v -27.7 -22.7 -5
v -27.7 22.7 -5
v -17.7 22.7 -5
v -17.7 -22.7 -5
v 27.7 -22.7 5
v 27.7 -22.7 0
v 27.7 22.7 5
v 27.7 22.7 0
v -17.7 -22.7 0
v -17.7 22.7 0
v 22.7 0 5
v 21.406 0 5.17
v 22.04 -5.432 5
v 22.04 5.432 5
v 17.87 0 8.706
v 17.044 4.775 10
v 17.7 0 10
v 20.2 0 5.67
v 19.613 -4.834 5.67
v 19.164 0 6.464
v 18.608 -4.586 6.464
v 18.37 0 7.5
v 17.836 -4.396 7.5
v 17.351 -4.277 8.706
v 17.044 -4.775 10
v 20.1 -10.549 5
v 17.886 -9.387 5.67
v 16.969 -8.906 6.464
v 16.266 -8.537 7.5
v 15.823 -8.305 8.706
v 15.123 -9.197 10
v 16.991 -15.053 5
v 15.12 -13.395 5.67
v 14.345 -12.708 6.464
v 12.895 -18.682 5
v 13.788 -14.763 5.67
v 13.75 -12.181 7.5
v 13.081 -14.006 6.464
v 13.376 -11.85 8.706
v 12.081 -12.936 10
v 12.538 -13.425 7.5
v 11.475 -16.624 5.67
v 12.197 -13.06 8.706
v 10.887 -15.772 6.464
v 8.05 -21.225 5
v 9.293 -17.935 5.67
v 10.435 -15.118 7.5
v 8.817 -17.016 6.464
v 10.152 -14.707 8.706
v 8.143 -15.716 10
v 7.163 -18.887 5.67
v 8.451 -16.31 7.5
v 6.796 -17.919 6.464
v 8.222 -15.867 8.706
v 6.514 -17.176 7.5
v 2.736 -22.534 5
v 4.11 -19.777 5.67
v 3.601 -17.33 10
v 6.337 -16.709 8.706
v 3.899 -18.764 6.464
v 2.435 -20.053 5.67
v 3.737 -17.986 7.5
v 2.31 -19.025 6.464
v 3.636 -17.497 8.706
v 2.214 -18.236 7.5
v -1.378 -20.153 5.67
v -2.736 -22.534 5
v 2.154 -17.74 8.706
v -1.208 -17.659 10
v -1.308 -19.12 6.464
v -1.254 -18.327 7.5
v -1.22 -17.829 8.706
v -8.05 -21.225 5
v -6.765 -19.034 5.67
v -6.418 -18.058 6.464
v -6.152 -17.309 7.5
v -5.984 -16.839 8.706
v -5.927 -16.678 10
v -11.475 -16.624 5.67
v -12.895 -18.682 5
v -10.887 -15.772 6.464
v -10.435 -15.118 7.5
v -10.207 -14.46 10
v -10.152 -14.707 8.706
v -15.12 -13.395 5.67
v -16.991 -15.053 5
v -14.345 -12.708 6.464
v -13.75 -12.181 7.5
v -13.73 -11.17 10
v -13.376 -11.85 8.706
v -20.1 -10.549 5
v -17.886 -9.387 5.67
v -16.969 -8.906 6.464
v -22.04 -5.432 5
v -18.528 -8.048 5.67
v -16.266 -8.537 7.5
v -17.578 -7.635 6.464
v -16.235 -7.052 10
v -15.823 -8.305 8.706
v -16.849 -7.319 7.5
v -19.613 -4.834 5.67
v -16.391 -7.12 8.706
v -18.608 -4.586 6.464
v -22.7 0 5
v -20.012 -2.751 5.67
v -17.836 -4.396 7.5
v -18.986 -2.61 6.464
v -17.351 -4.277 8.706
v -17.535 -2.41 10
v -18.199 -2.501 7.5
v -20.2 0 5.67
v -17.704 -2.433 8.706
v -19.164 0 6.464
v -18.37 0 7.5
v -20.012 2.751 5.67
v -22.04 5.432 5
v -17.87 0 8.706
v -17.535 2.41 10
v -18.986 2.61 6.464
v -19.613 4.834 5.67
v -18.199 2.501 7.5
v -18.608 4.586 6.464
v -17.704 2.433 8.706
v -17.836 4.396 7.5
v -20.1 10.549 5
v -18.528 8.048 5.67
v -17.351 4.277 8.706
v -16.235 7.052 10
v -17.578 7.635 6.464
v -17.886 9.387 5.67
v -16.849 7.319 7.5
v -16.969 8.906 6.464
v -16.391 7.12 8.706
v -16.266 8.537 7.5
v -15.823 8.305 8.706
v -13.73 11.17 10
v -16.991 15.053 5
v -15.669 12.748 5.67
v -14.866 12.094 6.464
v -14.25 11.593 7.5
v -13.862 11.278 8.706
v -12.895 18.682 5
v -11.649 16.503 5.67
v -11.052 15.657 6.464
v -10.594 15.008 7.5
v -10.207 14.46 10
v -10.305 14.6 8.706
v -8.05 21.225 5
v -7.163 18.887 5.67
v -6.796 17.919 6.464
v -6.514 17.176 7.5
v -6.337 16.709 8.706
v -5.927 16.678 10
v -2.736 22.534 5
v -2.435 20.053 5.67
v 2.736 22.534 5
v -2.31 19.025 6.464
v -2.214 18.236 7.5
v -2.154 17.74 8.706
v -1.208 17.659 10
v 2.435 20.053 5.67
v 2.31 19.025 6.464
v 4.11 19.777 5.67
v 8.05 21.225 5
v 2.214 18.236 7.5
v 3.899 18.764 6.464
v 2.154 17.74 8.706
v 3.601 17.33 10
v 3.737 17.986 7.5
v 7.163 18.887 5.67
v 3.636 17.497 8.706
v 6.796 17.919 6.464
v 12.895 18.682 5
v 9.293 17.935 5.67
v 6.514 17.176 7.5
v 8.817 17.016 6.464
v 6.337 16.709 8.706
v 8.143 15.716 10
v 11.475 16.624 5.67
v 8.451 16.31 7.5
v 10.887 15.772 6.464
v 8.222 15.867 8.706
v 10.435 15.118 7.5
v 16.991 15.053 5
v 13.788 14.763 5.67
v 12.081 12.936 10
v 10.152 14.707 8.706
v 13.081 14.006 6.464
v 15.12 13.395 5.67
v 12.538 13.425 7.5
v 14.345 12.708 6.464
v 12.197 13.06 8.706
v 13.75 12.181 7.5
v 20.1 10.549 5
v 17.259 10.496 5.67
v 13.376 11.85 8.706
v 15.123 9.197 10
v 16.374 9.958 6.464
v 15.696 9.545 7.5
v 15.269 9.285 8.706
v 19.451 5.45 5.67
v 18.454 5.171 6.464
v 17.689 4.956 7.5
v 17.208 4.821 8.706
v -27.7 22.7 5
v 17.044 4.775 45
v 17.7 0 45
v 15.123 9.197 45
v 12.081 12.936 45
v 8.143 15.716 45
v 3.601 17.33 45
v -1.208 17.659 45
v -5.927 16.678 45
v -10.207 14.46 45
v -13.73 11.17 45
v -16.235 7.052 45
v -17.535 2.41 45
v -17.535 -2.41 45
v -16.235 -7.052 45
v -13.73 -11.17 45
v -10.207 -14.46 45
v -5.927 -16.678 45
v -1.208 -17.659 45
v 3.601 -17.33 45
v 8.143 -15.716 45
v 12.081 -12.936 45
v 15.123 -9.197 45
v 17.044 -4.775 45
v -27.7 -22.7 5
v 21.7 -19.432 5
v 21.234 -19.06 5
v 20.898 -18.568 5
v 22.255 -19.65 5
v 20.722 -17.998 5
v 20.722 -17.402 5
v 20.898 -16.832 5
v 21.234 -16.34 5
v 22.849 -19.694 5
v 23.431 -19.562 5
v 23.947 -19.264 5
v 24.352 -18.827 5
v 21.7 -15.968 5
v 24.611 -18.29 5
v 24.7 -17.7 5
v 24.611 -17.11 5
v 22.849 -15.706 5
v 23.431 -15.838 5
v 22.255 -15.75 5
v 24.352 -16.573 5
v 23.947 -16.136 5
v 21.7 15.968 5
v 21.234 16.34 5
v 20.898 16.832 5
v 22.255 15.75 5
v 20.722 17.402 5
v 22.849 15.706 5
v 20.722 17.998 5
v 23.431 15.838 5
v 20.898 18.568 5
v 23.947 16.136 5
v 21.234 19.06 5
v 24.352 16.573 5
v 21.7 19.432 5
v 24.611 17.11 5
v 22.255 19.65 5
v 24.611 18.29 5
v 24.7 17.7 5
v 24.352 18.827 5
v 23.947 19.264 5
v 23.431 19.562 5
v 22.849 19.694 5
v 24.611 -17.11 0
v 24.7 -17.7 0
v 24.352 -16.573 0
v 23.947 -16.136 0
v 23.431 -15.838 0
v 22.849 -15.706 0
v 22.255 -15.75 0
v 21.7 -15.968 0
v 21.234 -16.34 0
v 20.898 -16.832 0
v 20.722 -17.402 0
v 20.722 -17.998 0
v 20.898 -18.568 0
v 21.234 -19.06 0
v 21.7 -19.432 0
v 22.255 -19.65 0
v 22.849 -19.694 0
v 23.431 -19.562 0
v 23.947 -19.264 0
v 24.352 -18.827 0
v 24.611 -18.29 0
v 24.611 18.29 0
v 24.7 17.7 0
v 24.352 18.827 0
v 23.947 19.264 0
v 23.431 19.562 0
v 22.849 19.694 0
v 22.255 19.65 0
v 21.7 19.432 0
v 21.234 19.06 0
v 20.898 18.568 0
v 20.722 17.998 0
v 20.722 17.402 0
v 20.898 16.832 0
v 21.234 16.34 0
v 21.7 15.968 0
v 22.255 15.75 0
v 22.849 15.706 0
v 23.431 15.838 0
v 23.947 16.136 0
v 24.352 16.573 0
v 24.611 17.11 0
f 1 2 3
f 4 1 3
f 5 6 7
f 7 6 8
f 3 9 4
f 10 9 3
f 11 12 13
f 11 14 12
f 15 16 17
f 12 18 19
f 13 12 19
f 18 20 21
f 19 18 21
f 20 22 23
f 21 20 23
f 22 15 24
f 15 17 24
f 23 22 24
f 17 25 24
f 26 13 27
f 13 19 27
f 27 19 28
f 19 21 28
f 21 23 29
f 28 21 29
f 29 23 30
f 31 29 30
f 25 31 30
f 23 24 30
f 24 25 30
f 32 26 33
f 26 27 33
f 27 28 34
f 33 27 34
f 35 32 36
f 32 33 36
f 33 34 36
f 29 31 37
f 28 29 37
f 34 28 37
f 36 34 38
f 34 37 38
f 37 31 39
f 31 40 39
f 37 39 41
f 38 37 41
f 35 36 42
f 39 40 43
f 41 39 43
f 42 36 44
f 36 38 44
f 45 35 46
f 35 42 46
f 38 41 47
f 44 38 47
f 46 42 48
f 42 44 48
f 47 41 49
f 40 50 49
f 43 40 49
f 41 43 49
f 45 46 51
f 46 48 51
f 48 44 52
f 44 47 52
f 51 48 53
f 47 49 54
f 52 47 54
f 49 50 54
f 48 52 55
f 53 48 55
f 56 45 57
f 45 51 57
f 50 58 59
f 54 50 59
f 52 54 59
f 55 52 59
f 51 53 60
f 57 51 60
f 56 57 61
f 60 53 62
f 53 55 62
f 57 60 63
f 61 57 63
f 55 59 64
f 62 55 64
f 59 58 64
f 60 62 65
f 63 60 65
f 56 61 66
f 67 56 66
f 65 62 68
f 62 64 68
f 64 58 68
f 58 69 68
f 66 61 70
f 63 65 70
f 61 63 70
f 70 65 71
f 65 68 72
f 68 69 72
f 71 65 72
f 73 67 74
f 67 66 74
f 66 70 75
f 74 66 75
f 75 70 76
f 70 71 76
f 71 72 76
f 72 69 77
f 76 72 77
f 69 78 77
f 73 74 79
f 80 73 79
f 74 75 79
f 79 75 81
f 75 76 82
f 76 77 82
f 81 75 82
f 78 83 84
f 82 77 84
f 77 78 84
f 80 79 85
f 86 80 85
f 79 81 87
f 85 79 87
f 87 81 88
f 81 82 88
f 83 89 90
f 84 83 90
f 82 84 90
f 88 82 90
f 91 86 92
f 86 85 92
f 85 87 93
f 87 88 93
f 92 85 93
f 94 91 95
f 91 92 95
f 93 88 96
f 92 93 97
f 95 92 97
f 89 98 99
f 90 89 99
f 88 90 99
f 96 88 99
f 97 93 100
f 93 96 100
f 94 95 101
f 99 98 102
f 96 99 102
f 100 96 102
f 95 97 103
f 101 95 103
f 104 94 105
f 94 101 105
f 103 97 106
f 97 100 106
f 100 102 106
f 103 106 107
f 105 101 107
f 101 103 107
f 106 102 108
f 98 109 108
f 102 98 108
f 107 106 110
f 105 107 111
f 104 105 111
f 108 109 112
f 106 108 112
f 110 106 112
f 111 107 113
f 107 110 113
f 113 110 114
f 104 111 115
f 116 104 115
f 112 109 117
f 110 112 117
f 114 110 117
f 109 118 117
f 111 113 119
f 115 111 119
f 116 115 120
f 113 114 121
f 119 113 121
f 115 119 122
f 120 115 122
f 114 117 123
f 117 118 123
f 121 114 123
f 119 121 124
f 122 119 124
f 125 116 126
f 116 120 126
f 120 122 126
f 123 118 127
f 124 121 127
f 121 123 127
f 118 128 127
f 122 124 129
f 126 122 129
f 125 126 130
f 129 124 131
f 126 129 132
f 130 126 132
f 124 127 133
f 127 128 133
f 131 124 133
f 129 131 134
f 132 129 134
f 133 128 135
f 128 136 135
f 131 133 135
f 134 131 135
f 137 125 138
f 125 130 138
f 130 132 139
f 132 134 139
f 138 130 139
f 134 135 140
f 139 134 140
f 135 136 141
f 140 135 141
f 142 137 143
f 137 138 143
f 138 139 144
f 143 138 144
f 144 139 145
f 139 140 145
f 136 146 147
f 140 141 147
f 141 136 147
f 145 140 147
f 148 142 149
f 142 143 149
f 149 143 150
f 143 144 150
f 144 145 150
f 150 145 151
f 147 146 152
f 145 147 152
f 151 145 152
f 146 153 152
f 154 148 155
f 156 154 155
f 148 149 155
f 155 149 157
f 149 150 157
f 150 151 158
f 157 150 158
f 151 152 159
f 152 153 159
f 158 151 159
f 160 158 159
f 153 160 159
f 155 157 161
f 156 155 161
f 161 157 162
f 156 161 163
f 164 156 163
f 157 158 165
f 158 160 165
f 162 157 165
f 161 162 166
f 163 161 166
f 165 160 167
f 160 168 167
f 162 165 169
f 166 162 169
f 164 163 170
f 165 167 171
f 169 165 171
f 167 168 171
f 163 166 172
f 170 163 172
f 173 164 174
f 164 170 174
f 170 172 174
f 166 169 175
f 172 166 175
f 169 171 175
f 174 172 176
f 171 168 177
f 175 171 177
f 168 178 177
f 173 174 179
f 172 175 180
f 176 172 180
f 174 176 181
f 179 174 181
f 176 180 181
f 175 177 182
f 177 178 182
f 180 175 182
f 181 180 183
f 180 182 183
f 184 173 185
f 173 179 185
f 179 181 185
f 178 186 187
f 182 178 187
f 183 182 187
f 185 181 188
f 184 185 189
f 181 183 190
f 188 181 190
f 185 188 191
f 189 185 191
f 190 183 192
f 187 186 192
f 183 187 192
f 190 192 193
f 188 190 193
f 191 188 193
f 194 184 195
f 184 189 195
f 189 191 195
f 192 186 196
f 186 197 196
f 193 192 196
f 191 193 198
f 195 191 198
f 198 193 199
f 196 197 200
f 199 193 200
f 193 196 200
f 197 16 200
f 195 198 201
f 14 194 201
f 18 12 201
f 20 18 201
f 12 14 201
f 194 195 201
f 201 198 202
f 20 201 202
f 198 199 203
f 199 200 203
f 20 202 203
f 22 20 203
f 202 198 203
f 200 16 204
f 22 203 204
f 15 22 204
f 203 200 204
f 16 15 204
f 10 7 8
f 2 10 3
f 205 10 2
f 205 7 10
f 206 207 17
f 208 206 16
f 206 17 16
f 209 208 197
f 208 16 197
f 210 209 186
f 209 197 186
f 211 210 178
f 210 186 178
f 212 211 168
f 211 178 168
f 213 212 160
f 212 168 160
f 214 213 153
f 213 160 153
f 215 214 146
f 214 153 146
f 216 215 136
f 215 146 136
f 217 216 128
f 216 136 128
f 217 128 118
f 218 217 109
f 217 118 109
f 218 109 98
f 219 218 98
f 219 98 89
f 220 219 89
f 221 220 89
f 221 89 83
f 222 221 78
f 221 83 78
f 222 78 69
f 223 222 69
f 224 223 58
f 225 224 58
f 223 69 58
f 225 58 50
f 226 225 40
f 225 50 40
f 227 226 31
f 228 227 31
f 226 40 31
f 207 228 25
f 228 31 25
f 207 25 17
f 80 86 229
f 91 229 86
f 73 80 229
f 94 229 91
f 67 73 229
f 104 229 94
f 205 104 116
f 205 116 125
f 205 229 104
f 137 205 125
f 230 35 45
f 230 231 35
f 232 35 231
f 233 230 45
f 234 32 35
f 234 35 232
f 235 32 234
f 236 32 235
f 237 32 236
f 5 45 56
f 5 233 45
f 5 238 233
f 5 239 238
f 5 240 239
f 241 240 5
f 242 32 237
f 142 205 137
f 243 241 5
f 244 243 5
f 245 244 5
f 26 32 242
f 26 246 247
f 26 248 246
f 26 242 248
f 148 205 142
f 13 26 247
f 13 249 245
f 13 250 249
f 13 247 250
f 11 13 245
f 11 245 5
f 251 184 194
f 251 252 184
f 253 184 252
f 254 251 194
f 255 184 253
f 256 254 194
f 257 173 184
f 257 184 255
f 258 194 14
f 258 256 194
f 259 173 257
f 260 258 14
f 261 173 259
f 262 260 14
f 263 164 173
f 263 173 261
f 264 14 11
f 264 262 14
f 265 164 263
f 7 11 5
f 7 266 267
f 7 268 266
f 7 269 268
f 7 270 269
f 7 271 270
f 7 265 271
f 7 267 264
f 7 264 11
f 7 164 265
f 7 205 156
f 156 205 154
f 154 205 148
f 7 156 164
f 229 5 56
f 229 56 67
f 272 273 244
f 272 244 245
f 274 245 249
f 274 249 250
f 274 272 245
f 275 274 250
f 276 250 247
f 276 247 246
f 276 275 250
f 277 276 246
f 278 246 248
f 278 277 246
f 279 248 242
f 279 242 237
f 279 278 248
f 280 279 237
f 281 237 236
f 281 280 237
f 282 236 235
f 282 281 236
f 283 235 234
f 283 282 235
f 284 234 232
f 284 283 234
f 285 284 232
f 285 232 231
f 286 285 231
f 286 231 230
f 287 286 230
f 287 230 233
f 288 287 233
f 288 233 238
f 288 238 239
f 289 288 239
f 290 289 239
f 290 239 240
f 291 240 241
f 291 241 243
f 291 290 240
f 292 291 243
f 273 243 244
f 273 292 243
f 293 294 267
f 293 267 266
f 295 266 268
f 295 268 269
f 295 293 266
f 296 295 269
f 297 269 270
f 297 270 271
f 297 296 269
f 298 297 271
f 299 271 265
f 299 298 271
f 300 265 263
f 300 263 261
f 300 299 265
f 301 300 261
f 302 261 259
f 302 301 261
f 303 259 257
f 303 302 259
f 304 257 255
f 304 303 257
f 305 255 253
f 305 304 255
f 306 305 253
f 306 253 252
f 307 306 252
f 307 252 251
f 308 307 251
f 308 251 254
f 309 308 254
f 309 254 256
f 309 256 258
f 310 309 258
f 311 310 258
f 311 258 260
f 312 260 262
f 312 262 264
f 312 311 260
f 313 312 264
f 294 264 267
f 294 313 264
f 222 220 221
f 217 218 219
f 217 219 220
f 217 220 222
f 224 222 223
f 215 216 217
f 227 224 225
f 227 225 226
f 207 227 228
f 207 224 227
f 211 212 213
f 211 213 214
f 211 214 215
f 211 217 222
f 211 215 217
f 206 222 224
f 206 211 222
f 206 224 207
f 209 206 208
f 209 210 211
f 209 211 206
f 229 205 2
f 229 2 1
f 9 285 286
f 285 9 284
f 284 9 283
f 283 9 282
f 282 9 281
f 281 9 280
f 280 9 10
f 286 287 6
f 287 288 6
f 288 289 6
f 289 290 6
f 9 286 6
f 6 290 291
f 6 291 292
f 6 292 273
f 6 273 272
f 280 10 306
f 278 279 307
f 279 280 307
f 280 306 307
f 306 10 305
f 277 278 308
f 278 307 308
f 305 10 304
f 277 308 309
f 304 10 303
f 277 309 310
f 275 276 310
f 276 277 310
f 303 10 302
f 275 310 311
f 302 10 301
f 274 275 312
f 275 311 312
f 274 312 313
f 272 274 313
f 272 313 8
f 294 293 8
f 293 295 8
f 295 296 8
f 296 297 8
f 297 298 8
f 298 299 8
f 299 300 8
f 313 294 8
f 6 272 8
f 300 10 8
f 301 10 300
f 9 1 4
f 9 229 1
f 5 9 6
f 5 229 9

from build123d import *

# Parameters (mm, degrees)
F0_R     = 2
F1_DEPTH = 5
F2_DEPTH = 45
F3_DEPTH = 5
F4_DEPTH = 5
F5_R     = 4.99999


# Not quite as in the source:
# - a fillet or chamfer is up to 0.001 mm smaller than in the source, because OpenCascade refuses the exact size


with BuildPart() as f1:
    # F0 (on Top) → F1 (new body)
    with BuildSketch(Plane.XY):
        Polygon((-17.7, 22.7), (-17.7, 0), (-17.7, -22.7), (27.7, -22.7), (27.7, 22.7), align=None)
        with Locations((22.7, -17.7)):
            Circle(F0_R, mode=Mode.SUBTRACT)
        with BuildLine():
            ThreePointArc((-17.7, 0), (0, 17.7), (17.7, 0))
            ThreePointArc((17.7, 0), (0, -17.7), (-17.7, 0))
        make_face(mode=Mode.SUBTRACT)
        with Locations((22.7, 17.7)):
            Circle(F0_R, mode=Mode.SUBTRACT)
        with BuildLine():
            ThreePointArc((-17.7, 0), (0, -17.7), (17.7, 0))
            ThreePointArc((17.7, 0), (0, 17.7), (-17.7, 0))
        make_face()
    extrude(amount=F1_DEPTH)

    # F0 (on Top) → F2 (join)
    with BuildSketch(Plane.XY):
        with BuildLine():
            ThreePointArc((-17.7, 0), (0, -17.7), (17.7, 0))
            ThreePointArc((17.7, 0), (0, 17.7), (-17.7, 0))
        make_face()
    extrude(amount=F2_DEPTH)

    # F0 (on Top) → F3 (join, through all)
    with BuildSketch(Plane.XY):
        Polygon((-17.7, -22.7), (-17.7, 0), (-17.7, 22.7), (-27.7, 22.7), (-27.7, -22.7), align=None)
    extrude(amount=F3_DEPTH)

    # F0 (on Top) → F4 (join)
    with BuildSketch(Plane.XY):
        Polygon((-17.7, -22.7), (-17.7, 0), (-17.7, 22.7), (-27.7, 22.7), (-27.7, -22.7), align=None)
    extrude(amount=-F4_DEPTH)

    # F5 (radius 5 in the source; OpenCascade refuses exactly that, so slightly less here)
    f5_edges = [f1.edges().sort_by_distance(p)[0] for p in [
        (-17.7, 0, 5),
    ]]
    fillet(f5_edges, radius=F5_R)


solid = f1.part
